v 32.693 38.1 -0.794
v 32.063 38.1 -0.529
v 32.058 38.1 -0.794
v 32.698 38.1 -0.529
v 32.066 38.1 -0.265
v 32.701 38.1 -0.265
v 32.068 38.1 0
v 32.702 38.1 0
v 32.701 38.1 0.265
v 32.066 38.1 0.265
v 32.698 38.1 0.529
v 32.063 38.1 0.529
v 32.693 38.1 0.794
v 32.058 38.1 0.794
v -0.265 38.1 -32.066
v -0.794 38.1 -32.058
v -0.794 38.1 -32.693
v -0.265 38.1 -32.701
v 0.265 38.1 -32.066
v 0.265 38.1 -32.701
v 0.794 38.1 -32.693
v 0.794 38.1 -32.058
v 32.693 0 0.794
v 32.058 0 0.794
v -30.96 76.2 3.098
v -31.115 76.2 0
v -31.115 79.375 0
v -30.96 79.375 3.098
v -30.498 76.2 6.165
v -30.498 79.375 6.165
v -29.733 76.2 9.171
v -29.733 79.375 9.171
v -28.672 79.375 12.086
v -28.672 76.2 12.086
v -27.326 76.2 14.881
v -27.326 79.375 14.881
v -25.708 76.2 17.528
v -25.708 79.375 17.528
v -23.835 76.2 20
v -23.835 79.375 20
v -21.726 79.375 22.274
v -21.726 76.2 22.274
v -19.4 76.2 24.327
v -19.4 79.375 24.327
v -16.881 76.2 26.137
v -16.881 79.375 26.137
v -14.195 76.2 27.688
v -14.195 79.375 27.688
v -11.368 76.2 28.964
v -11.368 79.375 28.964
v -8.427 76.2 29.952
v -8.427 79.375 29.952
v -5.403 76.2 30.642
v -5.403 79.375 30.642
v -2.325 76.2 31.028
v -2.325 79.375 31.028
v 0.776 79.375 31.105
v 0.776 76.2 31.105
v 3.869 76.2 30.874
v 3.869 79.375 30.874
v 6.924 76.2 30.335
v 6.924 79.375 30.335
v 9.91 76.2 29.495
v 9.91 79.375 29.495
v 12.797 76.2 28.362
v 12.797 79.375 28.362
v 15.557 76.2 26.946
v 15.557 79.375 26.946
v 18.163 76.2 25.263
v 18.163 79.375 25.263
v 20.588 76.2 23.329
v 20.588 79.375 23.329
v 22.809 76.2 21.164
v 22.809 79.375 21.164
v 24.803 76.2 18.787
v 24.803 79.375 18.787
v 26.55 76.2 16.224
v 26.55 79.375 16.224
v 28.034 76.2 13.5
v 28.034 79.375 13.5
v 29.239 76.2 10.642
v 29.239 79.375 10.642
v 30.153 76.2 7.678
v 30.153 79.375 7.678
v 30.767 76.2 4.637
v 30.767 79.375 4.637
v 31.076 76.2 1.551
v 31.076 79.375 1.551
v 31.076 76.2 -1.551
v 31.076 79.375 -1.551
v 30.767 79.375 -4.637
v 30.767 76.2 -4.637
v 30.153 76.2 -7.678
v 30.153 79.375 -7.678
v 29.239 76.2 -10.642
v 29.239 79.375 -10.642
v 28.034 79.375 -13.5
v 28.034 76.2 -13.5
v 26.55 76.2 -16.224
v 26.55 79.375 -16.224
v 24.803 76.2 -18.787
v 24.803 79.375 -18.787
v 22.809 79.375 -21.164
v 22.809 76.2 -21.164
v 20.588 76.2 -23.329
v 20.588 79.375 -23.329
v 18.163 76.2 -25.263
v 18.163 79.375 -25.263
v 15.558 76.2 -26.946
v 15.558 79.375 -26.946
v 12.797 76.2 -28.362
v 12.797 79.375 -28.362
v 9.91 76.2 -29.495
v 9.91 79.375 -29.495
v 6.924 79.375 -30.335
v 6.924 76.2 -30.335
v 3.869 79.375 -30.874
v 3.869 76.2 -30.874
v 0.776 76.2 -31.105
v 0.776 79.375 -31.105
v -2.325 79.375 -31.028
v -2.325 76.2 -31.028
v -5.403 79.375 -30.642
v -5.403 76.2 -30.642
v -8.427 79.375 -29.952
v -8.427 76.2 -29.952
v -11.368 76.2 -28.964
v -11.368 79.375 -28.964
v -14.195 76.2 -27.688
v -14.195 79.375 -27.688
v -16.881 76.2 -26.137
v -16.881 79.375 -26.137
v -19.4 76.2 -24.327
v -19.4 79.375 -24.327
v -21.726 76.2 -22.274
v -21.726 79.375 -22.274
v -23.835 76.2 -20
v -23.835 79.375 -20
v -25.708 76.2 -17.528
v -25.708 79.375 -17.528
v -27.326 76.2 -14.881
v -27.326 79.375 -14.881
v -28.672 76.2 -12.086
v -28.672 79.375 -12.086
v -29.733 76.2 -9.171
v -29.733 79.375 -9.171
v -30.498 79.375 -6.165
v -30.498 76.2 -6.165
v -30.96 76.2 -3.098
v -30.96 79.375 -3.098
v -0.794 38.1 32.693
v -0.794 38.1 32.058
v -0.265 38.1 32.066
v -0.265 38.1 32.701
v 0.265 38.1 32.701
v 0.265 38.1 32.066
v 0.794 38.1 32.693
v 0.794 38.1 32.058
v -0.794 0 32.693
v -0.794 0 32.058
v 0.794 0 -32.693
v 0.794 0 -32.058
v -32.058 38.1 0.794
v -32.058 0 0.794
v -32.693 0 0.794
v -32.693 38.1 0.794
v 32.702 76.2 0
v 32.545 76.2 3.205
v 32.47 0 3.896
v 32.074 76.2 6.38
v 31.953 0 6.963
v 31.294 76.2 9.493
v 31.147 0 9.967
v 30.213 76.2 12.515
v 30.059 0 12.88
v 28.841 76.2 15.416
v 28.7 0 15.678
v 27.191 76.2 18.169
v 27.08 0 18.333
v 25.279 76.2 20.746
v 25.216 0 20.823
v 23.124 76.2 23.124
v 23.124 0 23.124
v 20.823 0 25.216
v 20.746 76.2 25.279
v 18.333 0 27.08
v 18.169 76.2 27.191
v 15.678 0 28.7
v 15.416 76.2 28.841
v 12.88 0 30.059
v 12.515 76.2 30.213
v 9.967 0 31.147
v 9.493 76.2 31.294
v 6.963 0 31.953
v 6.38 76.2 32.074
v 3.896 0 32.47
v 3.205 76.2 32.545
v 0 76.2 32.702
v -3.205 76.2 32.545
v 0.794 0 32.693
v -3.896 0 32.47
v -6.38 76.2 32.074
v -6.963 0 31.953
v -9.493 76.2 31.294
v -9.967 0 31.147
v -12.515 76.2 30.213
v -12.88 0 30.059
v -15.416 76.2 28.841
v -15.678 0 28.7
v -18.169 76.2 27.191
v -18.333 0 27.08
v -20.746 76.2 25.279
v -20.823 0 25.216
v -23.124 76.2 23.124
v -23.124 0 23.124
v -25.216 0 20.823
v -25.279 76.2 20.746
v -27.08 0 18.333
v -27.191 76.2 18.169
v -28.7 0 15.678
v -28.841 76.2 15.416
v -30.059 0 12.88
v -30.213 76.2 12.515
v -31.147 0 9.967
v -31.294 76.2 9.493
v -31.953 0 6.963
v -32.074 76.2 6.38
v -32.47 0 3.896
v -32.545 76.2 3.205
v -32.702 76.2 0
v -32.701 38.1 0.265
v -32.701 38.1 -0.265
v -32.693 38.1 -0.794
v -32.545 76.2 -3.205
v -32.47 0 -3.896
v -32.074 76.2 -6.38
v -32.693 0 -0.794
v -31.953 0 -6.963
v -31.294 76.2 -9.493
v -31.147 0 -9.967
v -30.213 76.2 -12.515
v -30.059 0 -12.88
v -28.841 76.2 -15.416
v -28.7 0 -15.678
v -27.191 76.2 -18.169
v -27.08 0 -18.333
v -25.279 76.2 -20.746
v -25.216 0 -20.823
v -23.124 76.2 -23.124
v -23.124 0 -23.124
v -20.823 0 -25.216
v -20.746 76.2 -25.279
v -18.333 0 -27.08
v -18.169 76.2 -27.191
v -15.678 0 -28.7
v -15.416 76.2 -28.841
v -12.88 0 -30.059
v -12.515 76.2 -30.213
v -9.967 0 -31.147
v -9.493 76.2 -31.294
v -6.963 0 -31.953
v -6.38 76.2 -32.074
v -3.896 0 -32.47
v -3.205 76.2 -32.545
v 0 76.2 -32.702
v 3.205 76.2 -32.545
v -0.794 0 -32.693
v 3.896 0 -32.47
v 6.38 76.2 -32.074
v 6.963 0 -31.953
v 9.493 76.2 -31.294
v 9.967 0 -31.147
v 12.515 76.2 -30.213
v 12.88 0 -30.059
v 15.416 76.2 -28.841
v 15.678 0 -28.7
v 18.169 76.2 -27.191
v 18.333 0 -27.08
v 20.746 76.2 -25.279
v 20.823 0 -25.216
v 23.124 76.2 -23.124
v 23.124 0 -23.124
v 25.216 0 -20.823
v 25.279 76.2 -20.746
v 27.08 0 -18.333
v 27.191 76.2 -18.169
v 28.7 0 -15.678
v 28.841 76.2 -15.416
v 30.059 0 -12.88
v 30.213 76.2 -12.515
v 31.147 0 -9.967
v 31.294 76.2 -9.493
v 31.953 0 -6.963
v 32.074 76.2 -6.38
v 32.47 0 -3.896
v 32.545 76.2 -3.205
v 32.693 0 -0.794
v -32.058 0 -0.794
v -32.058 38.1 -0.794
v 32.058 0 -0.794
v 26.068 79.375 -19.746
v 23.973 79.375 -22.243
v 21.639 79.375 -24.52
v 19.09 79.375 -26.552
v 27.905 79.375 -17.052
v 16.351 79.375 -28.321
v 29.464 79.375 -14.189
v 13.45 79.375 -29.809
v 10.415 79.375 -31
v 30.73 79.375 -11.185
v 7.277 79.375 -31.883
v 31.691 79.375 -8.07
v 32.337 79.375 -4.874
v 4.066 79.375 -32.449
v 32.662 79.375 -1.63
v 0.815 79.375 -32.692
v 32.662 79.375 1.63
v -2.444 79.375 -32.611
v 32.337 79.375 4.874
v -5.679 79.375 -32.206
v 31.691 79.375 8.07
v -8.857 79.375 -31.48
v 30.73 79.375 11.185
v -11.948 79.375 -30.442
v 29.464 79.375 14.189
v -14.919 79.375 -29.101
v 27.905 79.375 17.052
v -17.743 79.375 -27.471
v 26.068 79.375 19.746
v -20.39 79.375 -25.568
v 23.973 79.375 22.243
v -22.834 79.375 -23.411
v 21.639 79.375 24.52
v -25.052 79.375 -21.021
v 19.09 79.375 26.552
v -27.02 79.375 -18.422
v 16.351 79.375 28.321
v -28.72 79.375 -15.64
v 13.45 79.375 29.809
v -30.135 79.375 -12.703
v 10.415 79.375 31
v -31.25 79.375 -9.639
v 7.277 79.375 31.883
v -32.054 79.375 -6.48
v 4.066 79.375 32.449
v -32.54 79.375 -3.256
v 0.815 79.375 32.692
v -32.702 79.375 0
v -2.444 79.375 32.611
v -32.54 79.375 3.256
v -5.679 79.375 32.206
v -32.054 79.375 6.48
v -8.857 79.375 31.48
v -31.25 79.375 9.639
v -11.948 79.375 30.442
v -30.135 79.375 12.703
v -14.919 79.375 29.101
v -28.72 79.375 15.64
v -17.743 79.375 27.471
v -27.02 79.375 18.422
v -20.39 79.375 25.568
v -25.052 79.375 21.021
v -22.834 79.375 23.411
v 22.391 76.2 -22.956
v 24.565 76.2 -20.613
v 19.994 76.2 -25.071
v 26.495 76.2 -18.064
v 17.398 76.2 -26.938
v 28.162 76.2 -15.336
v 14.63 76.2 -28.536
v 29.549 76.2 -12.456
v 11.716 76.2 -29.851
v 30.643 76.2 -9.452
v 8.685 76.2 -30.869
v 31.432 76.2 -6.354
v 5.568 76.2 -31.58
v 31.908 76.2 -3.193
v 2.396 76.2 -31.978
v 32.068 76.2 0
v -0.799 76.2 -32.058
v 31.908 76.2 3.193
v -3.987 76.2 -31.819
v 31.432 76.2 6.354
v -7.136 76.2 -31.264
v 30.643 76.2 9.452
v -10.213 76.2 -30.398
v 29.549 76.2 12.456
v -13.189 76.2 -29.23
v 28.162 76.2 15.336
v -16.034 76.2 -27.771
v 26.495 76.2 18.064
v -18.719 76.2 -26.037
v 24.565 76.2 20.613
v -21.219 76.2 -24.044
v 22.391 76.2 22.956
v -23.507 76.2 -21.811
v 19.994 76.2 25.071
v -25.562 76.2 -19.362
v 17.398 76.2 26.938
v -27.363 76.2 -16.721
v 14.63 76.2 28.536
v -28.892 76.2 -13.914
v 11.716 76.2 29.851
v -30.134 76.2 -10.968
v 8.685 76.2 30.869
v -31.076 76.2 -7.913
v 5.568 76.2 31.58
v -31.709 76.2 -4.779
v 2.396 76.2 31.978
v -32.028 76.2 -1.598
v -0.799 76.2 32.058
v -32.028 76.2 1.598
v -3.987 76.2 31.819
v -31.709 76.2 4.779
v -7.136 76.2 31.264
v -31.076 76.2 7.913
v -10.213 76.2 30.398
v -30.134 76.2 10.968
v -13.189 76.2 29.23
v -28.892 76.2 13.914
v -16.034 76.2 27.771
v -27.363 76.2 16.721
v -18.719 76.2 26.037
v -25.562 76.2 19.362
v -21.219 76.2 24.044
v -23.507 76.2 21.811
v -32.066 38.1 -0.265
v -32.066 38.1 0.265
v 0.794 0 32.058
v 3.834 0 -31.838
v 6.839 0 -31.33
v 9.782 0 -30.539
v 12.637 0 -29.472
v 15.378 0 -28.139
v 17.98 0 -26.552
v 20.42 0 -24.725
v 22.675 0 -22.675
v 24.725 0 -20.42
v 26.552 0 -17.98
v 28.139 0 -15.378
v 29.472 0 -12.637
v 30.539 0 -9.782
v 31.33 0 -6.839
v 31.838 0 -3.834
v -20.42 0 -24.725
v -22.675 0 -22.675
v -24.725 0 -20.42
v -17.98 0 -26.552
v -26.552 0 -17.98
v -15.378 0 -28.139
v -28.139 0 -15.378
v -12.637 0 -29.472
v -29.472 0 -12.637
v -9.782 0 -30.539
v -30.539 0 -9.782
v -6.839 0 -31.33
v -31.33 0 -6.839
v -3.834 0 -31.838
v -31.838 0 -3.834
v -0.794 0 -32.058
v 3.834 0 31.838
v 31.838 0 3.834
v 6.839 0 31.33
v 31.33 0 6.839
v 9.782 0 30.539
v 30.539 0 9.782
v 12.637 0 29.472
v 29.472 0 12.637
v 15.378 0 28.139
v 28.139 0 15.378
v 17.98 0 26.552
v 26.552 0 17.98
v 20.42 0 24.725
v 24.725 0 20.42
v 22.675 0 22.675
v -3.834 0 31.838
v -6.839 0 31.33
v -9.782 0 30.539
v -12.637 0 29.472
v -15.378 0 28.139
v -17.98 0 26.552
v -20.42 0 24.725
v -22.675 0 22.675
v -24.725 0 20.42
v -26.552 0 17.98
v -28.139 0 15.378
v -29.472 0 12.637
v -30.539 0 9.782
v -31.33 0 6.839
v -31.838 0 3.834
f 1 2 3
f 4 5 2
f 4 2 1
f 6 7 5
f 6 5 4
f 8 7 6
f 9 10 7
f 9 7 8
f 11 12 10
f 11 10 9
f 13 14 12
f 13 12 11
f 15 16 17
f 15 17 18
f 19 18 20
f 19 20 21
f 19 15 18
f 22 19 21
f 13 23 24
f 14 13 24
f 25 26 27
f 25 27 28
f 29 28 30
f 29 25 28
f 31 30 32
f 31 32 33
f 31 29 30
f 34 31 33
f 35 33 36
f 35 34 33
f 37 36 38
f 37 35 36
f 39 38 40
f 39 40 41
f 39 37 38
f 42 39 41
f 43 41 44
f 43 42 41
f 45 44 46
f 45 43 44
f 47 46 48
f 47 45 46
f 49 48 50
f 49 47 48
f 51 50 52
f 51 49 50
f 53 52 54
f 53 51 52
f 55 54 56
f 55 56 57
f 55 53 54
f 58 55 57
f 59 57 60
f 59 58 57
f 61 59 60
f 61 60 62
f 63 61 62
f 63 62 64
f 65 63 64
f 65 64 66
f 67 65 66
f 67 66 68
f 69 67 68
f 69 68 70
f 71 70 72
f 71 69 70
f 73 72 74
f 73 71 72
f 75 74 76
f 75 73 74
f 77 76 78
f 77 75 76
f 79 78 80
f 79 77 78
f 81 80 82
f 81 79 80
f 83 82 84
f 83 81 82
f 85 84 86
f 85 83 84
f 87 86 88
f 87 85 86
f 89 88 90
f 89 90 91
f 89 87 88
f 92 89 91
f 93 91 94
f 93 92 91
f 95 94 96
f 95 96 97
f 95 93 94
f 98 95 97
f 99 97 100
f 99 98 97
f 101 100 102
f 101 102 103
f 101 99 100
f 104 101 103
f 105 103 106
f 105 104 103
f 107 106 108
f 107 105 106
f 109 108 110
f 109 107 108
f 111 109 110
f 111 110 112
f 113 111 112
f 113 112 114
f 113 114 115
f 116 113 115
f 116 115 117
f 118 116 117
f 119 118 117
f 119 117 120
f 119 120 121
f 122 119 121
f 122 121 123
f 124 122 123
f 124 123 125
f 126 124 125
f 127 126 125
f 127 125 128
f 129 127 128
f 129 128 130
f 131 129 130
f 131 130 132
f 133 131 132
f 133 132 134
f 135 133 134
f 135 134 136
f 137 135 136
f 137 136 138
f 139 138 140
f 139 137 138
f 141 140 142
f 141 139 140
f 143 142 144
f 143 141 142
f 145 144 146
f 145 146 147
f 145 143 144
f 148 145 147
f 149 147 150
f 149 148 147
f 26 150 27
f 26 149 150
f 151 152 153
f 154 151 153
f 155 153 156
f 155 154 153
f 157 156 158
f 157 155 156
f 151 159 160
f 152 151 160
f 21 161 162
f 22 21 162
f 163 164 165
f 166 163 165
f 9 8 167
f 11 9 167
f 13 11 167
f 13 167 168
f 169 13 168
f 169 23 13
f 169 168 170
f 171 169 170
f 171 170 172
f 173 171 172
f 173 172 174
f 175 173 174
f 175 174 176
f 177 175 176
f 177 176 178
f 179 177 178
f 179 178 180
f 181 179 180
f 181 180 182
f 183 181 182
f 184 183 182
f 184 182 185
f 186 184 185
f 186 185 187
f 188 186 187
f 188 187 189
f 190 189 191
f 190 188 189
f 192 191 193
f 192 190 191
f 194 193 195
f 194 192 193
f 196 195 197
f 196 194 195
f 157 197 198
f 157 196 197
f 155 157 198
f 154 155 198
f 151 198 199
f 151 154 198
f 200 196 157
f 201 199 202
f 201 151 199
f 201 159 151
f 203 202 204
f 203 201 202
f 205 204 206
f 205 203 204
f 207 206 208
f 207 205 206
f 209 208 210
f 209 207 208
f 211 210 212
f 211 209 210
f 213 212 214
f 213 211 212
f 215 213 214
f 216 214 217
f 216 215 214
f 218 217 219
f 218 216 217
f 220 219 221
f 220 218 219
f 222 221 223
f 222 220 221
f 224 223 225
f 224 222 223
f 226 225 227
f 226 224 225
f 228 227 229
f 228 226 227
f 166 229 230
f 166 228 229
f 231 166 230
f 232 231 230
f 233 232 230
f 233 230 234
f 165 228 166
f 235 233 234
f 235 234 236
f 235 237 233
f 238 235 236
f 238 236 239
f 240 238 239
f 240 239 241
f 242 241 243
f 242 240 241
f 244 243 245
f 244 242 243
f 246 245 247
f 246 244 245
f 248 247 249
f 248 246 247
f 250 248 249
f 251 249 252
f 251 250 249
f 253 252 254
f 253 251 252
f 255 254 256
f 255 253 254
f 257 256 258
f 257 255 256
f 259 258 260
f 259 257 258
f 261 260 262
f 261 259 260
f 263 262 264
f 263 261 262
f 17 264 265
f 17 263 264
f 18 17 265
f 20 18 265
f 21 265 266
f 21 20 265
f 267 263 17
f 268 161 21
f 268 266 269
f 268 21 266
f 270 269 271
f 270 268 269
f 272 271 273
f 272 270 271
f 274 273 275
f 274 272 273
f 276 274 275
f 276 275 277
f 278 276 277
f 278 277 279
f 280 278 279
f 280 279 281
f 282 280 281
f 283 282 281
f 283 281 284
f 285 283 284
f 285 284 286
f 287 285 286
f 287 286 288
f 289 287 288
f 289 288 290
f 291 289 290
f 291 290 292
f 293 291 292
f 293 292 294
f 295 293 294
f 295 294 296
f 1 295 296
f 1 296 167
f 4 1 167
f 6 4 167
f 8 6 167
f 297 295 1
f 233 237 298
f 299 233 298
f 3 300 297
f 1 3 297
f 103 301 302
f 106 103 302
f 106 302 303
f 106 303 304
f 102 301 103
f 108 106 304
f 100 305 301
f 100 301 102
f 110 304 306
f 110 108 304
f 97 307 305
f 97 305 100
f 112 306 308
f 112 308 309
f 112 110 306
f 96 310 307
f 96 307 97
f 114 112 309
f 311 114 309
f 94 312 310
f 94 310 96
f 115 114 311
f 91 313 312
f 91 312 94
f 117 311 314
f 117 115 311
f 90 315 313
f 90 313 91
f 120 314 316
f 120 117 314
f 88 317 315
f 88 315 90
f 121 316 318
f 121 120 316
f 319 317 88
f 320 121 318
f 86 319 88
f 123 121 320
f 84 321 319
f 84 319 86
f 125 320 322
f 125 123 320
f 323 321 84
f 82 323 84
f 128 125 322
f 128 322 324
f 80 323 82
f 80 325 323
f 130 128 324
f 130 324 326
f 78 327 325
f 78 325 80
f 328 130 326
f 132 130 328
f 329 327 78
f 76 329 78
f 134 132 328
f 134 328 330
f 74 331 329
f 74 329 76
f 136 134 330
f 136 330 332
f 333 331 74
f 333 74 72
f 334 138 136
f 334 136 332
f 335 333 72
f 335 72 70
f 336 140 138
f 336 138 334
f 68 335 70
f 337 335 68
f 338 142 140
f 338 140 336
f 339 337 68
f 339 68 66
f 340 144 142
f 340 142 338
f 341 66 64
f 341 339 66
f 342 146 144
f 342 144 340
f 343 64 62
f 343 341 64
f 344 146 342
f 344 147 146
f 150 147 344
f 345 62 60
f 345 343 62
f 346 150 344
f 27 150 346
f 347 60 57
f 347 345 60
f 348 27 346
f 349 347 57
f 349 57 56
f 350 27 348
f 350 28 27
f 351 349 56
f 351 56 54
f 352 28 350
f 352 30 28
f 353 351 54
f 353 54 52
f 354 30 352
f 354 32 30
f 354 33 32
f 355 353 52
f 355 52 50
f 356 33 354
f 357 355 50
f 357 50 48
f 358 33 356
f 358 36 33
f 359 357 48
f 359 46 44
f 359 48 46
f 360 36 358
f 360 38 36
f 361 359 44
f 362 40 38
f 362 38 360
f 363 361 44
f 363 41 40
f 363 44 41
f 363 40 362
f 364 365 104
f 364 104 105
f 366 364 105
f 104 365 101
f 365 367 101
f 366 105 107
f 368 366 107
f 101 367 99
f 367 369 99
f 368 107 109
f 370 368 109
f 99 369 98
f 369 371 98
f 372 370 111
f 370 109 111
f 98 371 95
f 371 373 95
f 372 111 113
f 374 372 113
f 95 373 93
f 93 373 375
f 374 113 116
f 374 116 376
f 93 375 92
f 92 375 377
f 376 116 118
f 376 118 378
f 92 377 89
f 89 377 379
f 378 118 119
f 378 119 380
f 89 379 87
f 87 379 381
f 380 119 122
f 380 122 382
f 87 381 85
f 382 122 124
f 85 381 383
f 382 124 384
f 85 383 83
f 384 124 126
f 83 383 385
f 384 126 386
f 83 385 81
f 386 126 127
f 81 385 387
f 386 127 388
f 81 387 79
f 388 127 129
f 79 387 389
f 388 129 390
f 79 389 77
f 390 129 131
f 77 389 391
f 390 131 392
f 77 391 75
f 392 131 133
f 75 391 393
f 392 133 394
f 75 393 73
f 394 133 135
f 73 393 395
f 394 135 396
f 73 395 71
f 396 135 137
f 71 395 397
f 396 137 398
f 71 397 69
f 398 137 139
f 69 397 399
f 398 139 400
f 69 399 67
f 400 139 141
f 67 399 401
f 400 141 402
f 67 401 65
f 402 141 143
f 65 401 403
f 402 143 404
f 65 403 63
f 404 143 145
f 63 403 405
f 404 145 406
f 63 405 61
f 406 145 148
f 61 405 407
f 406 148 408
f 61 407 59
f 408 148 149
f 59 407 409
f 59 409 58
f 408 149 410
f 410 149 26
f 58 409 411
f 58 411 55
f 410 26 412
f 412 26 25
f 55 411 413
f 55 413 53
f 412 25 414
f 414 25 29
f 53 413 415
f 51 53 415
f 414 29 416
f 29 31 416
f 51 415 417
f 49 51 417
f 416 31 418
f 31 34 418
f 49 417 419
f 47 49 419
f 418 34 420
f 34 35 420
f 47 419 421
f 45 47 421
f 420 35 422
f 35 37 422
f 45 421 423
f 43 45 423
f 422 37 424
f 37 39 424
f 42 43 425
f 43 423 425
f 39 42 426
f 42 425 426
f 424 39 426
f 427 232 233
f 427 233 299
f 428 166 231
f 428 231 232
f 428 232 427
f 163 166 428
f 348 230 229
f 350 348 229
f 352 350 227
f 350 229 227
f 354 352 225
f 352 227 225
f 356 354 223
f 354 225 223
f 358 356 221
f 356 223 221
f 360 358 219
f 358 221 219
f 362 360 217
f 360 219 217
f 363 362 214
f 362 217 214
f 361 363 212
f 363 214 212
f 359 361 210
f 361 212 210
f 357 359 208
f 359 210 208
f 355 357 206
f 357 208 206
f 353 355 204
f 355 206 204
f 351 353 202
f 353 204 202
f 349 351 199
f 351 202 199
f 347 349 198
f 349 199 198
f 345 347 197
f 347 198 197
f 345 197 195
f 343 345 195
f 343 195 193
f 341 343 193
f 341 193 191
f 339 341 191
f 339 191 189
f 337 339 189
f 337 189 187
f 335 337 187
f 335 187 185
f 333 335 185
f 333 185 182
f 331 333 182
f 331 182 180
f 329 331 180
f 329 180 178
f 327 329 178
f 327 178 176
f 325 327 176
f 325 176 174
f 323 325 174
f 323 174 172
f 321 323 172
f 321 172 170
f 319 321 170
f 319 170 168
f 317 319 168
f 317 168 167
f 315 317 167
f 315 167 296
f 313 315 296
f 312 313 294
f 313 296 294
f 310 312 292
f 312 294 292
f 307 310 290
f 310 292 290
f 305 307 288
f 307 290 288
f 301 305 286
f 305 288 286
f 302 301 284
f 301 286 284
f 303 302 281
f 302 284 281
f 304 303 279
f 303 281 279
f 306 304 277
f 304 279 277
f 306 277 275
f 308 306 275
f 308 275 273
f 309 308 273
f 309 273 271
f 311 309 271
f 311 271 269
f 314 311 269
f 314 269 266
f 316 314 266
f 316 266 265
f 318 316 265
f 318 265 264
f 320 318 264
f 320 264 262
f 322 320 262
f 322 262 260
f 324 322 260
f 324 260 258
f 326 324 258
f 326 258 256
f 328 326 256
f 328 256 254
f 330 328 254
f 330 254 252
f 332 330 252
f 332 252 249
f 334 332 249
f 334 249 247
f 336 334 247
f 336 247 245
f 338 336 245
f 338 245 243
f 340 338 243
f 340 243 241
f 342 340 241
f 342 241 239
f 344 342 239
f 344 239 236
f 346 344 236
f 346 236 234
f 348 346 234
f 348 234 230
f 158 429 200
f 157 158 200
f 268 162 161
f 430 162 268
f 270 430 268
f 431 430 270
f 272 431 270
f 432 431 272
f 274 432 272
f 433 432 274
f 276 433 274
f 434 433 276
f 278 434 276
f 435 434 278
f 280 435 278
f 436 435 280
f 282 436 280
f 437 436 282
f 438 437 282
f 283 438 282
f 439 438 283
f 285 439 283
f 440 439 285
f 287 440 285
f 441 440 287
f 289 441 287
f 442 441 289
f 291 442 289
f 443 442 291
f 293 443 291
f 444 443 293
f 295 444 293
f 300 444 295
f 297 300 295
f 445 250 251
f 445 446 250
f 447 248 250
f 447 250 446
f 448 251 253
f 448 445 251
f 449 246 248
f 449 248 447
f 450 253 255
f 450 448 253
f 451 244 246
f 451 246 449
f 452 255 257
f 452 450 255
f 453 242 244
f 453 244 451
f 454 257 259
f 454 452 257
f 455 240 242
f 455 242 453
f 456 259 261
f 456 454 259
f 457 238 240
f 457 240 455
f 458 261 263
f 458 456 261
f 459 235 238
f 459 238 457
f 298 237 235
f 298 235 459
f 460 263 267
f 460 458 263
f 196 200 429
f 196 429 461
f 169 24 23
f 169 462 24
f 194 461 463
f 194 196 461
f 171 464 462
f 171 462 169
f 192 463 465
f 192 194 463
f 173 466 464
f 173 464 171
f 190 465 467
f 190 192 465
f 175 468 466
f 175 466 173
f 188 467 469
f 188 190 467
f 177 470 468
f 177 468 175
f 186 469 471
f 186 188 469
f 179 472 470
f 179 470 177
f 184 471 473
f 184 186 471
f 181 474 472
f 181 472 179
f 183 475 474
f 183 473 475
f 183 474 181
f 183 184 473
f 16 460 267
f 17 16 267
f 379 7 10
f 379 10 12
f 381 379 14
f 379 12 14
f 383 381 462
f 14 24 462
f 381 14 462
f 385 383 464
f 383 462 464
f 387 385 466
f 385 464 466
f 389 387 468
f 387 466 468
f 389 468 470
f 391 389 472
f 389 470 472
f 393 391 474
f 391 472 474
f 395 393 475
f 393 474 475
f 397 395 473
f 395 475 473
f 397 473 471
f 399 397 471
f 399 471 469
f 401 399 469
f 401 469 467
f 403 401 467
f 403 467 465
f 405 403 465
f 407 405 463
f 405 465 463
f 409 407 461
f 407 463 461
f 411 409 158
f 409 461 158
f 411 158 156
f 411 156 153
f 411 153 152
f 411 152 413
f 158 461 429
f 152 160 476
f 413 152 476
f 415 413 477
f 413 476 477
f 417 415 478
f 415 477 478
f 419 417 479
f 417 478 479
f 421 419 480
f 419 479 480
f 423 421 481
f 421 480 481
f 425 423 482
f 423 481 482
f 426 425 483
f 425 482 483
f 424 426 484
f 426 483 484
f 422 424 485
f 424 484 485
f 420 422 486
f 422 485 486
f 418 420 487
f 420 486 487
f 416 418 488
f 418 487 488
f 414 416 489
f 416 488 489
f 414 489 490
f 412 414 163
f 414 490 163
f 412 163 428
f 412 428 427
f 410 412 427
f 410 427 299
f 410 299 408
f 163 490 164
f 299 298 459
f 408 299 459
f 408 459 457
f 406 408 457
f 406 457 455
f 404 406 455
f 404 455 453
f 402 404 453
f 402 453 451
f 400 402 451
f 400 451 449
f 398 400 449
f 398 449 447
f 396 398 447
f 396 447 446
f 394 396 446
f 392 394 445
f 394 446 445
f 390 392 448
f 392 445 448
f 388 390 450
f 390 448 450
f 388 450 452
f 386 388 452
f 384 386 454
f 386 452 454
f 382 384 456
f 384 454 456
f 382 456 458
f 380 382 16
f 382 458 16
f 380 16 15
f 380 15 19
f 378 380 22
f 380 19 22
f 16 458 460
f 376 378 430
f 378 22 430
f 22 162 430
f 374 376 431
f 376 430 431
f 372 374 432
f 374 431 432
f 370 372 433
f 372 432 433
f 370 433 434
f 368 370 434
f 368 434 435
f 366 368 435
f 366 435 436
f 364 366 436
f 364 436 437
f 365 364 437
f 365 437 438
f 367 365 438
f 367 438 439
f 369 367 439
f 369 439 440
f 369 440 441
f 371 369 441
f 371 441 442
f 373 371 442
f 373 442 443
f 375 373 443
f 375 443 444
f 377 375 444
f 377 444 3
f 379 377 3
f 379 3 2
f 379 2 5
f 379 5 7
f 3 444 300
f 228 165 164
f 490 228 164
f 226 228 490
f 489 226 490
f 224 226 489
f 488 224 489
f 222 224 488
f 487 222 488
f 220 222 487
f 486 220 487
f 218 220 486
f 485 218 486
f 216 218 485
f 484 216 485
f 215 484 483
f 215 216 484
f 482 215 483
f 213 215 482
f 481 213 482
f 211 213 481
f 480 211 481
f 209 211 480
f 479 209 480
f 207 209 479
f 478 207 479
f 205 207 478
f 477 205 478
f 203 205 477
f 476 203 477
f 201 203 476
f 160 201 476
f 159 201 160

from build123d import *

# Parameters (mm, degrees)
F0_R     = 32.7025
F0_R_2   = 32.0675
F1_DEPTH = 76.2
F3_DEPTH = 38.1
F4_R     = 32.7025
F4_R_2   = 31.115
F5_DEPTH = 3.175


with BuildPart() as f1:
    # F0 (on Front) → F1 (new body)
    with BuildSketch(Plane.XZ):
        Circle(F0_R)
        Circle(F0_R_2, mode=Mode.SUBTRACT)
    extrude(amount=-F1_DEPTH)

    # F2 (on Front) → F3 (cut)
    with BuildSketch(Plane.XZ):
        Polygon((0.79375, 0.79375), (0.79375, 51.373329), (-0.79375, 51.373329), (-0.79375, 0.79375), (-50.8, 0.79375), (-50.8, -0.79375), (-0.79375, -0.79375), (-0.79375, -42.451348), (0.79375, -42.451348), (0.79375, -0.79375), (50.8, -0.79375), (50.8, 0.79375), align=None)
    extrude(amount=-F3_DEPTH, mode=Mode.SUBTRACT)

    # F4 (on face) → F5 (join)
    with BuildSketch(Plane(origin=(0, 76.2, 0), x_dir=(-1, 0, 0), z_dir=(0, 1, 0))):
        Circle(F4_R)
        Circle(F4_R_2, mode=Mode.SUBTRACT)
    extrude(amount=F5_DEPTH)


solid = f1.part
